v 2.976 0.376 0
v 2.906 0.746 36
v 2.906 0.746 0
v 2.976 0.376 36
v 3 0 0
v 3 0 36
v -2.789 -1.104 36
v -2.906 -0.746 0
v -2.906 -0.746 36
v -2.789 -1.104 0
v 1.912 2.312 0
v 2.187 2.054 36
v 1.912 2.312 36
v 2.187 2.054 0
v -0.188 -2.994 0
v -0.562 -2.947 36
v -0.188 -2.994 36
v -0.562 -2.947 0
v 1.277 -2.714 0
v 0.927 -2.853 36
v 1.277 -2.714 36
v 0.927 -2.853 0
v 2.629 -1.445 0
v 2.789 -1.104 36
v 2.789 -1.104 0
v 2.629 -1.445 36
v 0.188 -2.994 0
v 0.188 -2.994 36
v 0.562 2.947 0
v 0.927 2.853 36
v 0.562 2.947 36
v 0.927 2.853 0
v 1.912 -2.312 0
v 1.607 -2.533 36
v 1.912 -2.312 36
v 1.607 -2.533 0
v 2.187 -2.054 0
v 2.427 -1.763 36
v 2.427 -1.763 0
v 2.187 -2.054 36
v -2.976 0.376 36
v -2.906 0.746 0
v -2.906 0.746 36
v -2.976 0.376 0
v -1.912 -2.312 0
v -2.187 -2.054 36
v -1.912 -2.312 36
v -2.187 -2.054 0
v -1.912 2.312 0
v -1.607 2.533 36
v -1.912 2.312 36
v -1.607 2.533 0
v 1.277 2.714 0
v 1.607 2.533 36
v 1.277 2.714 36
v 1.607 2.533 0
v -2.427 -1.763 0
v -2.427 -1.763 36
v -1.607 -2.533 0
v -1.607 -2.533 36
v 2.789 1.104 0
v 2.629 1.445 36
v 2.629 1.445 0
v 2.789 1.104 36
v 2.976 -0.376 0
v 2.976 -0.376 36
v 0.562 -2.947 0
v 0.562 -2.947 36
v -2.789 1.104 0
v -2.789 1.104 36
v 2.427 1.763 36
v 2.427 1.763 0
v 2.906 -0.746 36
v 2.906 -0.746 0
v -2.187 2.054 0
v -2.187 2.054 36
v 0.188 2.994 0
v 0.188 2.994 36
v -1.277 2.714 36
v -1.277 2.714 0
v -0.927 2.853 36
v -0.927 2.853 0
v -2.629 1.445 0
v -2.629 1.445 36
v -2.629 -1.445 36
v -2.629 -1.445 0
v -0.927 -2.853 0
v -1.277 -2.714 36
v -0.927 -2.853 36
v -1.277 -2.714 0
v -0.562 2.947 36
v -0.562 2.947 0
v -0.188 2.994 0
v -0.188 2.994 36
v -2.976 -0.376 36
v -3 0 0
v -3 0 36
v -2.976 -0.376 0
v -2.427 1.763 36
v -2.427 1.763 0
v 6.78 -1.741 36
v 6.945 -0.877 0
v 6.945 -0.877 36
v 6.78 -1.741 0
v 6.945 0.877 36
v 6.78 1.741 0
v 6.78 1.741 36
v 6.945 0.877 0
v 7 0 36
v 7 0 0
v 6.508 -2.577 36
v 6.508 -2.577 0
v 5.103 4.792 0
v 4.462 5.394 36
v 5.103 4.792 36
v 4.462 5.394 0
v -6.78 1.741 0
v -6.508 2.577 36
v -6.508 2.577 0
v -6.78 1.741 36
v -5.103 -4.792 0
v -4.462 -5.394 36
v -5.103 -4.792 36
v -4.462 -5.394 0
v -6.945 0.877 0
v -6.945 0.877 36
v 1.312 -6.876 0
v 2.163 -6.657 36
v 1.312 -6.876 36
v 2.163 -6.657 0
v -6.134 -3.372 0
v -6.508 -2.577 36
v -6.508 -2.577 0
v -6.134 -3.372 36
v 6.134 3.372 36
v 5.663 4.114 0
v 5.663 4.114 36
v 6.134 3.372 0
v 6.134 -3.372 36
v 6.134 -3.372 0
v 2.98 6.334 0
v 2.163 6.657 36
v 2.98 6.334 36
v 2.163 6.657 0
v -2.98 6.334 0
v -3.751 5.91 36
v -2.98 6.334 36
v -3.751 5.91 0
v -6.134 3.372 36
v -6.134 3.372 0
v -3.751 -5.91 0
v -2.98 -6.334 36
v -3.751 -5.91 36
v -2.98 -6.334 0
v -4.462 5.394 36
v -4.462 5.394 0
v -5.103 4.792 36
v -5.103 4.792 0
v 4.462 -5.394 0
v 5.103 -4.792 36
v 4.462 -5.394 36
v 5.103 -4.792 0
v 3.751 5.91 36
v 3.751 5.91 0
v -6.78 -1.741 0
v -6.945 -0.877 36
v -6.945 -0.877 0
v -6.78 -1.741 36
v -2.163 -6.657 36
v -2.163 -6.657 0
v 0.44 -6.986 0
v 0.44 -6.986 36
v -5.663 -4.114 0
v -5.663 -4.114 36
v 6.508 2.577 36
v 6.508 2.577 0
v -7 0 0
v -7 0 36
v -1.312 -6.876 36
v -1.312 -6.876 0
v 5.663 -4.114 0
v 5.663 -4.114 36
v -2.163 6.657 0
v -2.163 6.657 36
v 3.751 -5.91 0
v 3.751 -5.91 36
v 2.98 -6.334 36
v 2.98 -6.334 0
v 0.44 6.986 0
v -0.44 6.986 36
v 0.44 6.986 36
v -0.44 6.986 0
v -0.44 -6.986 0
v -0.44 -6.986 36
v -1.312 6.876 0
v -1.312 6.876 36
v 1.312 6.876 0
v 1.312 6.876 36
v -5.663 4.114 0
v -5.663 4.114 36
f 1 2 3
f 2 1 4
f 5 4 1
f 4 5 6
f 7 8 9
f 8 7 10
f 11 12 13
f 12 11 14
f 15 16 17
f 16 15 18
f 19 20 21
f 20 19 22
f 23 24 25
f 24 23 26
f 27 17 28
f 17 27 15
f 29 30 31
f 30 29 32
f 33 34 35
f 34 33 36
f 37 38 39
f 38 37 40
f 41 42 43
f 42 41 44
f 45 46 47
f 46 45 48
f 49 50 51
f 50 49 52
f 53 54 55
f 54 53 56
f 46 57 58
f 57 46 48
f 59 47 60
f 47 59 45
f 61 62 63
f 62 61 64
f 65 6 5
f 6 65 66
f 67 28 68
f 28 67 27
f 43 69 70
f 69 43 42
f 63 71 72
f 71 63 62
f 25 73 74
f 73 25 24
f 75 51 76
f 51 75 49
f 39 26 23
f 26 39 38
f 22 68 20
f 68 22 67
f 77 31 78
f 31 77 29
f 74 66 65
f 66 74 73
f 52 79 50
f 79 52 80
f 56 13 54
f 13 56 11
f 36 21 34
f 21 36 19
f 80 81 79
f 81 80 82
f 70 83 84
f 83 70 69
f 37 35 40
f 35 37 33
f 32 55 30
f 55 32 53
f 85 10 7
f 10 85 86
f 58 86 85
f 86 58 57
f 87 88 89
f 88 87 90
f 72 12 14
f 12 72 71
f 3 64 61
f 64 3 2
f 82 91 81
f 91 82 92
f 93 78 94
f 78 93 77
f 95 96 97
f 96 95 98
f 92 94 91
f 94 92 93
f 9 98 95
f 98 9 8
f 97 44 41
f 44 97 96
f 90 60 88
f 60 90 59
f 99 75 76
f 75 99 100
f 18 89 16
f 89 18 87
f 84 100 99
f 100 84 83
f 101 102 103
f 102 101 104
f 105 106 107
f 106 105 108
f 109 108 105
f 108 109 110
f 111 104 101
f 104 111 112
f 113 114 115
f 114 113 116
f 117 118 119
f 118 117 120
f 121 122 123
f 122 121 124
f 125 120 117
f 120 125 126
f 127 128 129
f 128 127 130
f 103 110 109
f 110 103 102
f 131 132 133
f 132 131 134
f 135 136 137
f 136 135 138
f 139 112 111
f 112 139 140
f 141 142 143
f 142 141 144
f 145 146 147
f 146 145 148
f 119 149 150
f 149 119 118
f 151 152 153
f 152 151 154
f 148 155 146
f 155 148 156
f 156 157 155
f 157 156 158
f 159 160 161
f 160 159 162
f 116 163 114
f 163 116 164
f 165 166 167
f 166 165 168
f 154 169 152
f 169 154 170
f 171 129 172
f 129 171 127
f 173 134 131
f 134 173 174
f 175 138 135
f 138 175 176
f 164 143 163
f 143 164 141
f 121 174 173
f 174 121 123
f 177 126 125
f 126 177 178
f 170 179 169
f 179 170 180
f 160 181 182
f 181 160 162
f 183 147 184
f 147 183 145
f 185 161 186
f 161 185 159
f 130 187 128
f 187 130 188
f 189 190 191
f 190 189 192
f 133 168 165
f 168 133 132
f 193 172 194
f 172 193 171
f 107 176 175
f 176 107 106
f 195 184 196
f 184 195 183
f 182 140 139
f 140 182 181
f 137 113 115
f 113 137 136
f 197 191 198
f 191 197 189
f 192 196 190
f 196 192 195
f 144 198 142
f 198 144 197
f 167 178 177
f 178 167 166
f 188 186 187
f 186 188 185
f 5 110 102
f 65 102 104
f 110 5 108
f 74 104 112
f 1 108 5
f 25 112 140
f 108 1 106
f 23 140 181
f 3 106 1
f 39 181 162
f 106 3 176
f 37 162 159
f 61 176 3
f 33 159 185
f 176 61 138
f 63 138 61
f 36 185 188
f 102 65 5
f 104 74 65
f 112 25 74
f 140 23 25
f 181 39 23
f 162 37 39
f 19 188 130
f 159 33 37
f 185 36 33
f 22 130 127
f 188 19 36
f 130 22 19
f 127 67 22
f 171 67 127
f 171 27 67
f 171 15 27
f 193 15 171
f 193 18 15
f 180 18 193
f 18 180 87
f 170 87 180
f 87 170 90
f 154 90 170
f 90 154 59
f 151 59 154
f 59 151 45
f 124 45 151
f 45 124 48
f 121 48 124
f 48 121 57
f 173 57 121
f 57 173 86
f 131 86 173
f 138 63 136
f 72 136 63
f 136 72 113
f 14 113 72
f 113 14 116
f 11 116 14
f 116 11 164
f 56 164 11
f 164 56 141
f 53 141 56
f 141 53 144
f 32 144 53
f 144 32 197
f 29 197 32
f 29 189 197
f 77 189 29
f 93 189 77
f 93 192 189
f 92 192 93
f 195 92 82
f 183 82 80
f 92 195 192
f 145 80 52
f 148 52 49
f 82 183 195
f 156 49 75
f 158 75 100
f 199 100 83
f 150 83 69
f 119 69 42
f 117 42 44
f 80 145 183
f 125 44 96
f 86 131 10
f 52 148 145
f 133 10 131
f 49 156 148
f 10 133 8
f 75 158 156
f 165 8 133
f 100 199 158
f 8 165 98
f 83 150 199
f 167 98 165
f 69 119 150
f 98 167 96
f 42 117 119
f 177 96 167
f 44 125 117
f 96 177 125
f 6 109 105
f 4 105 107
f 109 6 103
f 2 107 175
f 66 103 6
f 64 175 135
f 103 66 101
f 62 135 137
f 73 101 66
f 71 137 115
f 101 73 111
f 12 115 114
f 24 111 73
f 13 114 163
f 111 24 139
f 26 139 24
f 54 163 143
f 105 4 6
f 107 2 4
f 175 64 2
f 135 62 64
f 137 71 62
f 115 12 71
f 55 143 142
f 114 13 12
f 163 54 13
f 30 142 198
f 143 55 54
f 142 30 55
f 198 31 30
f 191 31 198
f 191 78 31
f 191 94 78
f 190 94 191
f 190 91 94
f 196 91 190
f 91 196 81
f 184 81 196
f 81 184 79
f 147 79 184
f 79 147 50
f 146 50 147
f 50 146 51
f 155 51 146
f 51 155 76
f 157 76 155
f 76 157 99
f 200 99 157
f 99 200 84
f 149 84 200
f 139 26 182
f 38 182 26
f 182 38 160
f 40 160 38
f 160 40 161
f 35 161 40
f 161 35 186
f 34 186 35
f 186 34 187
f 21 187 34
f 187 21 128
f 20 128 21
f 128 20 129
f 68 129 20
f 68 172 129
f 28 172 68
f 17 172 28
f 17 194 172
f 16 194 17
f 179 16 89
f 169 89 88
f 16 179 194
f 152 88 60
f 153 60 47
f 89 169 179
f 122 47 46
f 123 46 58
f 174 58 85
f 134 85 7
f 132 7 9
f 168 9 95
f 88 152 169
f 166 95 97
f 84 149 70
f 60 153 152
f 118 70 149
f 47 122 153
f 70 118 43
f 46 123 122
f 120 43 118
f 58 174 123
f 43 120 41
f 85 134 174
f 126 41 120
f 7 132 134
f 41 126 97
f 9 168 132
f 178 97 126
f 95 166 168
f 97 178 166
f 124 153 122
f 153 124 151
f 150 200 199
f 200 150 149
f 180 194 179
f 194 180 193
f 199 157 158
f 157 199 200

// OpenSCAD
$fn = 50;


difference() {
	union() {
		cylinder(h = 36, r = 7.0000000000);
	}
	union() {
		translate(v = [0, 0, -100]) {
			cylinder(h = 200, r = 3.0000000000);
		}
		translate(v = [0, 0, -100]) {
			cylinder(h = 200, r = 1.5000000000);
		}
	}
}
